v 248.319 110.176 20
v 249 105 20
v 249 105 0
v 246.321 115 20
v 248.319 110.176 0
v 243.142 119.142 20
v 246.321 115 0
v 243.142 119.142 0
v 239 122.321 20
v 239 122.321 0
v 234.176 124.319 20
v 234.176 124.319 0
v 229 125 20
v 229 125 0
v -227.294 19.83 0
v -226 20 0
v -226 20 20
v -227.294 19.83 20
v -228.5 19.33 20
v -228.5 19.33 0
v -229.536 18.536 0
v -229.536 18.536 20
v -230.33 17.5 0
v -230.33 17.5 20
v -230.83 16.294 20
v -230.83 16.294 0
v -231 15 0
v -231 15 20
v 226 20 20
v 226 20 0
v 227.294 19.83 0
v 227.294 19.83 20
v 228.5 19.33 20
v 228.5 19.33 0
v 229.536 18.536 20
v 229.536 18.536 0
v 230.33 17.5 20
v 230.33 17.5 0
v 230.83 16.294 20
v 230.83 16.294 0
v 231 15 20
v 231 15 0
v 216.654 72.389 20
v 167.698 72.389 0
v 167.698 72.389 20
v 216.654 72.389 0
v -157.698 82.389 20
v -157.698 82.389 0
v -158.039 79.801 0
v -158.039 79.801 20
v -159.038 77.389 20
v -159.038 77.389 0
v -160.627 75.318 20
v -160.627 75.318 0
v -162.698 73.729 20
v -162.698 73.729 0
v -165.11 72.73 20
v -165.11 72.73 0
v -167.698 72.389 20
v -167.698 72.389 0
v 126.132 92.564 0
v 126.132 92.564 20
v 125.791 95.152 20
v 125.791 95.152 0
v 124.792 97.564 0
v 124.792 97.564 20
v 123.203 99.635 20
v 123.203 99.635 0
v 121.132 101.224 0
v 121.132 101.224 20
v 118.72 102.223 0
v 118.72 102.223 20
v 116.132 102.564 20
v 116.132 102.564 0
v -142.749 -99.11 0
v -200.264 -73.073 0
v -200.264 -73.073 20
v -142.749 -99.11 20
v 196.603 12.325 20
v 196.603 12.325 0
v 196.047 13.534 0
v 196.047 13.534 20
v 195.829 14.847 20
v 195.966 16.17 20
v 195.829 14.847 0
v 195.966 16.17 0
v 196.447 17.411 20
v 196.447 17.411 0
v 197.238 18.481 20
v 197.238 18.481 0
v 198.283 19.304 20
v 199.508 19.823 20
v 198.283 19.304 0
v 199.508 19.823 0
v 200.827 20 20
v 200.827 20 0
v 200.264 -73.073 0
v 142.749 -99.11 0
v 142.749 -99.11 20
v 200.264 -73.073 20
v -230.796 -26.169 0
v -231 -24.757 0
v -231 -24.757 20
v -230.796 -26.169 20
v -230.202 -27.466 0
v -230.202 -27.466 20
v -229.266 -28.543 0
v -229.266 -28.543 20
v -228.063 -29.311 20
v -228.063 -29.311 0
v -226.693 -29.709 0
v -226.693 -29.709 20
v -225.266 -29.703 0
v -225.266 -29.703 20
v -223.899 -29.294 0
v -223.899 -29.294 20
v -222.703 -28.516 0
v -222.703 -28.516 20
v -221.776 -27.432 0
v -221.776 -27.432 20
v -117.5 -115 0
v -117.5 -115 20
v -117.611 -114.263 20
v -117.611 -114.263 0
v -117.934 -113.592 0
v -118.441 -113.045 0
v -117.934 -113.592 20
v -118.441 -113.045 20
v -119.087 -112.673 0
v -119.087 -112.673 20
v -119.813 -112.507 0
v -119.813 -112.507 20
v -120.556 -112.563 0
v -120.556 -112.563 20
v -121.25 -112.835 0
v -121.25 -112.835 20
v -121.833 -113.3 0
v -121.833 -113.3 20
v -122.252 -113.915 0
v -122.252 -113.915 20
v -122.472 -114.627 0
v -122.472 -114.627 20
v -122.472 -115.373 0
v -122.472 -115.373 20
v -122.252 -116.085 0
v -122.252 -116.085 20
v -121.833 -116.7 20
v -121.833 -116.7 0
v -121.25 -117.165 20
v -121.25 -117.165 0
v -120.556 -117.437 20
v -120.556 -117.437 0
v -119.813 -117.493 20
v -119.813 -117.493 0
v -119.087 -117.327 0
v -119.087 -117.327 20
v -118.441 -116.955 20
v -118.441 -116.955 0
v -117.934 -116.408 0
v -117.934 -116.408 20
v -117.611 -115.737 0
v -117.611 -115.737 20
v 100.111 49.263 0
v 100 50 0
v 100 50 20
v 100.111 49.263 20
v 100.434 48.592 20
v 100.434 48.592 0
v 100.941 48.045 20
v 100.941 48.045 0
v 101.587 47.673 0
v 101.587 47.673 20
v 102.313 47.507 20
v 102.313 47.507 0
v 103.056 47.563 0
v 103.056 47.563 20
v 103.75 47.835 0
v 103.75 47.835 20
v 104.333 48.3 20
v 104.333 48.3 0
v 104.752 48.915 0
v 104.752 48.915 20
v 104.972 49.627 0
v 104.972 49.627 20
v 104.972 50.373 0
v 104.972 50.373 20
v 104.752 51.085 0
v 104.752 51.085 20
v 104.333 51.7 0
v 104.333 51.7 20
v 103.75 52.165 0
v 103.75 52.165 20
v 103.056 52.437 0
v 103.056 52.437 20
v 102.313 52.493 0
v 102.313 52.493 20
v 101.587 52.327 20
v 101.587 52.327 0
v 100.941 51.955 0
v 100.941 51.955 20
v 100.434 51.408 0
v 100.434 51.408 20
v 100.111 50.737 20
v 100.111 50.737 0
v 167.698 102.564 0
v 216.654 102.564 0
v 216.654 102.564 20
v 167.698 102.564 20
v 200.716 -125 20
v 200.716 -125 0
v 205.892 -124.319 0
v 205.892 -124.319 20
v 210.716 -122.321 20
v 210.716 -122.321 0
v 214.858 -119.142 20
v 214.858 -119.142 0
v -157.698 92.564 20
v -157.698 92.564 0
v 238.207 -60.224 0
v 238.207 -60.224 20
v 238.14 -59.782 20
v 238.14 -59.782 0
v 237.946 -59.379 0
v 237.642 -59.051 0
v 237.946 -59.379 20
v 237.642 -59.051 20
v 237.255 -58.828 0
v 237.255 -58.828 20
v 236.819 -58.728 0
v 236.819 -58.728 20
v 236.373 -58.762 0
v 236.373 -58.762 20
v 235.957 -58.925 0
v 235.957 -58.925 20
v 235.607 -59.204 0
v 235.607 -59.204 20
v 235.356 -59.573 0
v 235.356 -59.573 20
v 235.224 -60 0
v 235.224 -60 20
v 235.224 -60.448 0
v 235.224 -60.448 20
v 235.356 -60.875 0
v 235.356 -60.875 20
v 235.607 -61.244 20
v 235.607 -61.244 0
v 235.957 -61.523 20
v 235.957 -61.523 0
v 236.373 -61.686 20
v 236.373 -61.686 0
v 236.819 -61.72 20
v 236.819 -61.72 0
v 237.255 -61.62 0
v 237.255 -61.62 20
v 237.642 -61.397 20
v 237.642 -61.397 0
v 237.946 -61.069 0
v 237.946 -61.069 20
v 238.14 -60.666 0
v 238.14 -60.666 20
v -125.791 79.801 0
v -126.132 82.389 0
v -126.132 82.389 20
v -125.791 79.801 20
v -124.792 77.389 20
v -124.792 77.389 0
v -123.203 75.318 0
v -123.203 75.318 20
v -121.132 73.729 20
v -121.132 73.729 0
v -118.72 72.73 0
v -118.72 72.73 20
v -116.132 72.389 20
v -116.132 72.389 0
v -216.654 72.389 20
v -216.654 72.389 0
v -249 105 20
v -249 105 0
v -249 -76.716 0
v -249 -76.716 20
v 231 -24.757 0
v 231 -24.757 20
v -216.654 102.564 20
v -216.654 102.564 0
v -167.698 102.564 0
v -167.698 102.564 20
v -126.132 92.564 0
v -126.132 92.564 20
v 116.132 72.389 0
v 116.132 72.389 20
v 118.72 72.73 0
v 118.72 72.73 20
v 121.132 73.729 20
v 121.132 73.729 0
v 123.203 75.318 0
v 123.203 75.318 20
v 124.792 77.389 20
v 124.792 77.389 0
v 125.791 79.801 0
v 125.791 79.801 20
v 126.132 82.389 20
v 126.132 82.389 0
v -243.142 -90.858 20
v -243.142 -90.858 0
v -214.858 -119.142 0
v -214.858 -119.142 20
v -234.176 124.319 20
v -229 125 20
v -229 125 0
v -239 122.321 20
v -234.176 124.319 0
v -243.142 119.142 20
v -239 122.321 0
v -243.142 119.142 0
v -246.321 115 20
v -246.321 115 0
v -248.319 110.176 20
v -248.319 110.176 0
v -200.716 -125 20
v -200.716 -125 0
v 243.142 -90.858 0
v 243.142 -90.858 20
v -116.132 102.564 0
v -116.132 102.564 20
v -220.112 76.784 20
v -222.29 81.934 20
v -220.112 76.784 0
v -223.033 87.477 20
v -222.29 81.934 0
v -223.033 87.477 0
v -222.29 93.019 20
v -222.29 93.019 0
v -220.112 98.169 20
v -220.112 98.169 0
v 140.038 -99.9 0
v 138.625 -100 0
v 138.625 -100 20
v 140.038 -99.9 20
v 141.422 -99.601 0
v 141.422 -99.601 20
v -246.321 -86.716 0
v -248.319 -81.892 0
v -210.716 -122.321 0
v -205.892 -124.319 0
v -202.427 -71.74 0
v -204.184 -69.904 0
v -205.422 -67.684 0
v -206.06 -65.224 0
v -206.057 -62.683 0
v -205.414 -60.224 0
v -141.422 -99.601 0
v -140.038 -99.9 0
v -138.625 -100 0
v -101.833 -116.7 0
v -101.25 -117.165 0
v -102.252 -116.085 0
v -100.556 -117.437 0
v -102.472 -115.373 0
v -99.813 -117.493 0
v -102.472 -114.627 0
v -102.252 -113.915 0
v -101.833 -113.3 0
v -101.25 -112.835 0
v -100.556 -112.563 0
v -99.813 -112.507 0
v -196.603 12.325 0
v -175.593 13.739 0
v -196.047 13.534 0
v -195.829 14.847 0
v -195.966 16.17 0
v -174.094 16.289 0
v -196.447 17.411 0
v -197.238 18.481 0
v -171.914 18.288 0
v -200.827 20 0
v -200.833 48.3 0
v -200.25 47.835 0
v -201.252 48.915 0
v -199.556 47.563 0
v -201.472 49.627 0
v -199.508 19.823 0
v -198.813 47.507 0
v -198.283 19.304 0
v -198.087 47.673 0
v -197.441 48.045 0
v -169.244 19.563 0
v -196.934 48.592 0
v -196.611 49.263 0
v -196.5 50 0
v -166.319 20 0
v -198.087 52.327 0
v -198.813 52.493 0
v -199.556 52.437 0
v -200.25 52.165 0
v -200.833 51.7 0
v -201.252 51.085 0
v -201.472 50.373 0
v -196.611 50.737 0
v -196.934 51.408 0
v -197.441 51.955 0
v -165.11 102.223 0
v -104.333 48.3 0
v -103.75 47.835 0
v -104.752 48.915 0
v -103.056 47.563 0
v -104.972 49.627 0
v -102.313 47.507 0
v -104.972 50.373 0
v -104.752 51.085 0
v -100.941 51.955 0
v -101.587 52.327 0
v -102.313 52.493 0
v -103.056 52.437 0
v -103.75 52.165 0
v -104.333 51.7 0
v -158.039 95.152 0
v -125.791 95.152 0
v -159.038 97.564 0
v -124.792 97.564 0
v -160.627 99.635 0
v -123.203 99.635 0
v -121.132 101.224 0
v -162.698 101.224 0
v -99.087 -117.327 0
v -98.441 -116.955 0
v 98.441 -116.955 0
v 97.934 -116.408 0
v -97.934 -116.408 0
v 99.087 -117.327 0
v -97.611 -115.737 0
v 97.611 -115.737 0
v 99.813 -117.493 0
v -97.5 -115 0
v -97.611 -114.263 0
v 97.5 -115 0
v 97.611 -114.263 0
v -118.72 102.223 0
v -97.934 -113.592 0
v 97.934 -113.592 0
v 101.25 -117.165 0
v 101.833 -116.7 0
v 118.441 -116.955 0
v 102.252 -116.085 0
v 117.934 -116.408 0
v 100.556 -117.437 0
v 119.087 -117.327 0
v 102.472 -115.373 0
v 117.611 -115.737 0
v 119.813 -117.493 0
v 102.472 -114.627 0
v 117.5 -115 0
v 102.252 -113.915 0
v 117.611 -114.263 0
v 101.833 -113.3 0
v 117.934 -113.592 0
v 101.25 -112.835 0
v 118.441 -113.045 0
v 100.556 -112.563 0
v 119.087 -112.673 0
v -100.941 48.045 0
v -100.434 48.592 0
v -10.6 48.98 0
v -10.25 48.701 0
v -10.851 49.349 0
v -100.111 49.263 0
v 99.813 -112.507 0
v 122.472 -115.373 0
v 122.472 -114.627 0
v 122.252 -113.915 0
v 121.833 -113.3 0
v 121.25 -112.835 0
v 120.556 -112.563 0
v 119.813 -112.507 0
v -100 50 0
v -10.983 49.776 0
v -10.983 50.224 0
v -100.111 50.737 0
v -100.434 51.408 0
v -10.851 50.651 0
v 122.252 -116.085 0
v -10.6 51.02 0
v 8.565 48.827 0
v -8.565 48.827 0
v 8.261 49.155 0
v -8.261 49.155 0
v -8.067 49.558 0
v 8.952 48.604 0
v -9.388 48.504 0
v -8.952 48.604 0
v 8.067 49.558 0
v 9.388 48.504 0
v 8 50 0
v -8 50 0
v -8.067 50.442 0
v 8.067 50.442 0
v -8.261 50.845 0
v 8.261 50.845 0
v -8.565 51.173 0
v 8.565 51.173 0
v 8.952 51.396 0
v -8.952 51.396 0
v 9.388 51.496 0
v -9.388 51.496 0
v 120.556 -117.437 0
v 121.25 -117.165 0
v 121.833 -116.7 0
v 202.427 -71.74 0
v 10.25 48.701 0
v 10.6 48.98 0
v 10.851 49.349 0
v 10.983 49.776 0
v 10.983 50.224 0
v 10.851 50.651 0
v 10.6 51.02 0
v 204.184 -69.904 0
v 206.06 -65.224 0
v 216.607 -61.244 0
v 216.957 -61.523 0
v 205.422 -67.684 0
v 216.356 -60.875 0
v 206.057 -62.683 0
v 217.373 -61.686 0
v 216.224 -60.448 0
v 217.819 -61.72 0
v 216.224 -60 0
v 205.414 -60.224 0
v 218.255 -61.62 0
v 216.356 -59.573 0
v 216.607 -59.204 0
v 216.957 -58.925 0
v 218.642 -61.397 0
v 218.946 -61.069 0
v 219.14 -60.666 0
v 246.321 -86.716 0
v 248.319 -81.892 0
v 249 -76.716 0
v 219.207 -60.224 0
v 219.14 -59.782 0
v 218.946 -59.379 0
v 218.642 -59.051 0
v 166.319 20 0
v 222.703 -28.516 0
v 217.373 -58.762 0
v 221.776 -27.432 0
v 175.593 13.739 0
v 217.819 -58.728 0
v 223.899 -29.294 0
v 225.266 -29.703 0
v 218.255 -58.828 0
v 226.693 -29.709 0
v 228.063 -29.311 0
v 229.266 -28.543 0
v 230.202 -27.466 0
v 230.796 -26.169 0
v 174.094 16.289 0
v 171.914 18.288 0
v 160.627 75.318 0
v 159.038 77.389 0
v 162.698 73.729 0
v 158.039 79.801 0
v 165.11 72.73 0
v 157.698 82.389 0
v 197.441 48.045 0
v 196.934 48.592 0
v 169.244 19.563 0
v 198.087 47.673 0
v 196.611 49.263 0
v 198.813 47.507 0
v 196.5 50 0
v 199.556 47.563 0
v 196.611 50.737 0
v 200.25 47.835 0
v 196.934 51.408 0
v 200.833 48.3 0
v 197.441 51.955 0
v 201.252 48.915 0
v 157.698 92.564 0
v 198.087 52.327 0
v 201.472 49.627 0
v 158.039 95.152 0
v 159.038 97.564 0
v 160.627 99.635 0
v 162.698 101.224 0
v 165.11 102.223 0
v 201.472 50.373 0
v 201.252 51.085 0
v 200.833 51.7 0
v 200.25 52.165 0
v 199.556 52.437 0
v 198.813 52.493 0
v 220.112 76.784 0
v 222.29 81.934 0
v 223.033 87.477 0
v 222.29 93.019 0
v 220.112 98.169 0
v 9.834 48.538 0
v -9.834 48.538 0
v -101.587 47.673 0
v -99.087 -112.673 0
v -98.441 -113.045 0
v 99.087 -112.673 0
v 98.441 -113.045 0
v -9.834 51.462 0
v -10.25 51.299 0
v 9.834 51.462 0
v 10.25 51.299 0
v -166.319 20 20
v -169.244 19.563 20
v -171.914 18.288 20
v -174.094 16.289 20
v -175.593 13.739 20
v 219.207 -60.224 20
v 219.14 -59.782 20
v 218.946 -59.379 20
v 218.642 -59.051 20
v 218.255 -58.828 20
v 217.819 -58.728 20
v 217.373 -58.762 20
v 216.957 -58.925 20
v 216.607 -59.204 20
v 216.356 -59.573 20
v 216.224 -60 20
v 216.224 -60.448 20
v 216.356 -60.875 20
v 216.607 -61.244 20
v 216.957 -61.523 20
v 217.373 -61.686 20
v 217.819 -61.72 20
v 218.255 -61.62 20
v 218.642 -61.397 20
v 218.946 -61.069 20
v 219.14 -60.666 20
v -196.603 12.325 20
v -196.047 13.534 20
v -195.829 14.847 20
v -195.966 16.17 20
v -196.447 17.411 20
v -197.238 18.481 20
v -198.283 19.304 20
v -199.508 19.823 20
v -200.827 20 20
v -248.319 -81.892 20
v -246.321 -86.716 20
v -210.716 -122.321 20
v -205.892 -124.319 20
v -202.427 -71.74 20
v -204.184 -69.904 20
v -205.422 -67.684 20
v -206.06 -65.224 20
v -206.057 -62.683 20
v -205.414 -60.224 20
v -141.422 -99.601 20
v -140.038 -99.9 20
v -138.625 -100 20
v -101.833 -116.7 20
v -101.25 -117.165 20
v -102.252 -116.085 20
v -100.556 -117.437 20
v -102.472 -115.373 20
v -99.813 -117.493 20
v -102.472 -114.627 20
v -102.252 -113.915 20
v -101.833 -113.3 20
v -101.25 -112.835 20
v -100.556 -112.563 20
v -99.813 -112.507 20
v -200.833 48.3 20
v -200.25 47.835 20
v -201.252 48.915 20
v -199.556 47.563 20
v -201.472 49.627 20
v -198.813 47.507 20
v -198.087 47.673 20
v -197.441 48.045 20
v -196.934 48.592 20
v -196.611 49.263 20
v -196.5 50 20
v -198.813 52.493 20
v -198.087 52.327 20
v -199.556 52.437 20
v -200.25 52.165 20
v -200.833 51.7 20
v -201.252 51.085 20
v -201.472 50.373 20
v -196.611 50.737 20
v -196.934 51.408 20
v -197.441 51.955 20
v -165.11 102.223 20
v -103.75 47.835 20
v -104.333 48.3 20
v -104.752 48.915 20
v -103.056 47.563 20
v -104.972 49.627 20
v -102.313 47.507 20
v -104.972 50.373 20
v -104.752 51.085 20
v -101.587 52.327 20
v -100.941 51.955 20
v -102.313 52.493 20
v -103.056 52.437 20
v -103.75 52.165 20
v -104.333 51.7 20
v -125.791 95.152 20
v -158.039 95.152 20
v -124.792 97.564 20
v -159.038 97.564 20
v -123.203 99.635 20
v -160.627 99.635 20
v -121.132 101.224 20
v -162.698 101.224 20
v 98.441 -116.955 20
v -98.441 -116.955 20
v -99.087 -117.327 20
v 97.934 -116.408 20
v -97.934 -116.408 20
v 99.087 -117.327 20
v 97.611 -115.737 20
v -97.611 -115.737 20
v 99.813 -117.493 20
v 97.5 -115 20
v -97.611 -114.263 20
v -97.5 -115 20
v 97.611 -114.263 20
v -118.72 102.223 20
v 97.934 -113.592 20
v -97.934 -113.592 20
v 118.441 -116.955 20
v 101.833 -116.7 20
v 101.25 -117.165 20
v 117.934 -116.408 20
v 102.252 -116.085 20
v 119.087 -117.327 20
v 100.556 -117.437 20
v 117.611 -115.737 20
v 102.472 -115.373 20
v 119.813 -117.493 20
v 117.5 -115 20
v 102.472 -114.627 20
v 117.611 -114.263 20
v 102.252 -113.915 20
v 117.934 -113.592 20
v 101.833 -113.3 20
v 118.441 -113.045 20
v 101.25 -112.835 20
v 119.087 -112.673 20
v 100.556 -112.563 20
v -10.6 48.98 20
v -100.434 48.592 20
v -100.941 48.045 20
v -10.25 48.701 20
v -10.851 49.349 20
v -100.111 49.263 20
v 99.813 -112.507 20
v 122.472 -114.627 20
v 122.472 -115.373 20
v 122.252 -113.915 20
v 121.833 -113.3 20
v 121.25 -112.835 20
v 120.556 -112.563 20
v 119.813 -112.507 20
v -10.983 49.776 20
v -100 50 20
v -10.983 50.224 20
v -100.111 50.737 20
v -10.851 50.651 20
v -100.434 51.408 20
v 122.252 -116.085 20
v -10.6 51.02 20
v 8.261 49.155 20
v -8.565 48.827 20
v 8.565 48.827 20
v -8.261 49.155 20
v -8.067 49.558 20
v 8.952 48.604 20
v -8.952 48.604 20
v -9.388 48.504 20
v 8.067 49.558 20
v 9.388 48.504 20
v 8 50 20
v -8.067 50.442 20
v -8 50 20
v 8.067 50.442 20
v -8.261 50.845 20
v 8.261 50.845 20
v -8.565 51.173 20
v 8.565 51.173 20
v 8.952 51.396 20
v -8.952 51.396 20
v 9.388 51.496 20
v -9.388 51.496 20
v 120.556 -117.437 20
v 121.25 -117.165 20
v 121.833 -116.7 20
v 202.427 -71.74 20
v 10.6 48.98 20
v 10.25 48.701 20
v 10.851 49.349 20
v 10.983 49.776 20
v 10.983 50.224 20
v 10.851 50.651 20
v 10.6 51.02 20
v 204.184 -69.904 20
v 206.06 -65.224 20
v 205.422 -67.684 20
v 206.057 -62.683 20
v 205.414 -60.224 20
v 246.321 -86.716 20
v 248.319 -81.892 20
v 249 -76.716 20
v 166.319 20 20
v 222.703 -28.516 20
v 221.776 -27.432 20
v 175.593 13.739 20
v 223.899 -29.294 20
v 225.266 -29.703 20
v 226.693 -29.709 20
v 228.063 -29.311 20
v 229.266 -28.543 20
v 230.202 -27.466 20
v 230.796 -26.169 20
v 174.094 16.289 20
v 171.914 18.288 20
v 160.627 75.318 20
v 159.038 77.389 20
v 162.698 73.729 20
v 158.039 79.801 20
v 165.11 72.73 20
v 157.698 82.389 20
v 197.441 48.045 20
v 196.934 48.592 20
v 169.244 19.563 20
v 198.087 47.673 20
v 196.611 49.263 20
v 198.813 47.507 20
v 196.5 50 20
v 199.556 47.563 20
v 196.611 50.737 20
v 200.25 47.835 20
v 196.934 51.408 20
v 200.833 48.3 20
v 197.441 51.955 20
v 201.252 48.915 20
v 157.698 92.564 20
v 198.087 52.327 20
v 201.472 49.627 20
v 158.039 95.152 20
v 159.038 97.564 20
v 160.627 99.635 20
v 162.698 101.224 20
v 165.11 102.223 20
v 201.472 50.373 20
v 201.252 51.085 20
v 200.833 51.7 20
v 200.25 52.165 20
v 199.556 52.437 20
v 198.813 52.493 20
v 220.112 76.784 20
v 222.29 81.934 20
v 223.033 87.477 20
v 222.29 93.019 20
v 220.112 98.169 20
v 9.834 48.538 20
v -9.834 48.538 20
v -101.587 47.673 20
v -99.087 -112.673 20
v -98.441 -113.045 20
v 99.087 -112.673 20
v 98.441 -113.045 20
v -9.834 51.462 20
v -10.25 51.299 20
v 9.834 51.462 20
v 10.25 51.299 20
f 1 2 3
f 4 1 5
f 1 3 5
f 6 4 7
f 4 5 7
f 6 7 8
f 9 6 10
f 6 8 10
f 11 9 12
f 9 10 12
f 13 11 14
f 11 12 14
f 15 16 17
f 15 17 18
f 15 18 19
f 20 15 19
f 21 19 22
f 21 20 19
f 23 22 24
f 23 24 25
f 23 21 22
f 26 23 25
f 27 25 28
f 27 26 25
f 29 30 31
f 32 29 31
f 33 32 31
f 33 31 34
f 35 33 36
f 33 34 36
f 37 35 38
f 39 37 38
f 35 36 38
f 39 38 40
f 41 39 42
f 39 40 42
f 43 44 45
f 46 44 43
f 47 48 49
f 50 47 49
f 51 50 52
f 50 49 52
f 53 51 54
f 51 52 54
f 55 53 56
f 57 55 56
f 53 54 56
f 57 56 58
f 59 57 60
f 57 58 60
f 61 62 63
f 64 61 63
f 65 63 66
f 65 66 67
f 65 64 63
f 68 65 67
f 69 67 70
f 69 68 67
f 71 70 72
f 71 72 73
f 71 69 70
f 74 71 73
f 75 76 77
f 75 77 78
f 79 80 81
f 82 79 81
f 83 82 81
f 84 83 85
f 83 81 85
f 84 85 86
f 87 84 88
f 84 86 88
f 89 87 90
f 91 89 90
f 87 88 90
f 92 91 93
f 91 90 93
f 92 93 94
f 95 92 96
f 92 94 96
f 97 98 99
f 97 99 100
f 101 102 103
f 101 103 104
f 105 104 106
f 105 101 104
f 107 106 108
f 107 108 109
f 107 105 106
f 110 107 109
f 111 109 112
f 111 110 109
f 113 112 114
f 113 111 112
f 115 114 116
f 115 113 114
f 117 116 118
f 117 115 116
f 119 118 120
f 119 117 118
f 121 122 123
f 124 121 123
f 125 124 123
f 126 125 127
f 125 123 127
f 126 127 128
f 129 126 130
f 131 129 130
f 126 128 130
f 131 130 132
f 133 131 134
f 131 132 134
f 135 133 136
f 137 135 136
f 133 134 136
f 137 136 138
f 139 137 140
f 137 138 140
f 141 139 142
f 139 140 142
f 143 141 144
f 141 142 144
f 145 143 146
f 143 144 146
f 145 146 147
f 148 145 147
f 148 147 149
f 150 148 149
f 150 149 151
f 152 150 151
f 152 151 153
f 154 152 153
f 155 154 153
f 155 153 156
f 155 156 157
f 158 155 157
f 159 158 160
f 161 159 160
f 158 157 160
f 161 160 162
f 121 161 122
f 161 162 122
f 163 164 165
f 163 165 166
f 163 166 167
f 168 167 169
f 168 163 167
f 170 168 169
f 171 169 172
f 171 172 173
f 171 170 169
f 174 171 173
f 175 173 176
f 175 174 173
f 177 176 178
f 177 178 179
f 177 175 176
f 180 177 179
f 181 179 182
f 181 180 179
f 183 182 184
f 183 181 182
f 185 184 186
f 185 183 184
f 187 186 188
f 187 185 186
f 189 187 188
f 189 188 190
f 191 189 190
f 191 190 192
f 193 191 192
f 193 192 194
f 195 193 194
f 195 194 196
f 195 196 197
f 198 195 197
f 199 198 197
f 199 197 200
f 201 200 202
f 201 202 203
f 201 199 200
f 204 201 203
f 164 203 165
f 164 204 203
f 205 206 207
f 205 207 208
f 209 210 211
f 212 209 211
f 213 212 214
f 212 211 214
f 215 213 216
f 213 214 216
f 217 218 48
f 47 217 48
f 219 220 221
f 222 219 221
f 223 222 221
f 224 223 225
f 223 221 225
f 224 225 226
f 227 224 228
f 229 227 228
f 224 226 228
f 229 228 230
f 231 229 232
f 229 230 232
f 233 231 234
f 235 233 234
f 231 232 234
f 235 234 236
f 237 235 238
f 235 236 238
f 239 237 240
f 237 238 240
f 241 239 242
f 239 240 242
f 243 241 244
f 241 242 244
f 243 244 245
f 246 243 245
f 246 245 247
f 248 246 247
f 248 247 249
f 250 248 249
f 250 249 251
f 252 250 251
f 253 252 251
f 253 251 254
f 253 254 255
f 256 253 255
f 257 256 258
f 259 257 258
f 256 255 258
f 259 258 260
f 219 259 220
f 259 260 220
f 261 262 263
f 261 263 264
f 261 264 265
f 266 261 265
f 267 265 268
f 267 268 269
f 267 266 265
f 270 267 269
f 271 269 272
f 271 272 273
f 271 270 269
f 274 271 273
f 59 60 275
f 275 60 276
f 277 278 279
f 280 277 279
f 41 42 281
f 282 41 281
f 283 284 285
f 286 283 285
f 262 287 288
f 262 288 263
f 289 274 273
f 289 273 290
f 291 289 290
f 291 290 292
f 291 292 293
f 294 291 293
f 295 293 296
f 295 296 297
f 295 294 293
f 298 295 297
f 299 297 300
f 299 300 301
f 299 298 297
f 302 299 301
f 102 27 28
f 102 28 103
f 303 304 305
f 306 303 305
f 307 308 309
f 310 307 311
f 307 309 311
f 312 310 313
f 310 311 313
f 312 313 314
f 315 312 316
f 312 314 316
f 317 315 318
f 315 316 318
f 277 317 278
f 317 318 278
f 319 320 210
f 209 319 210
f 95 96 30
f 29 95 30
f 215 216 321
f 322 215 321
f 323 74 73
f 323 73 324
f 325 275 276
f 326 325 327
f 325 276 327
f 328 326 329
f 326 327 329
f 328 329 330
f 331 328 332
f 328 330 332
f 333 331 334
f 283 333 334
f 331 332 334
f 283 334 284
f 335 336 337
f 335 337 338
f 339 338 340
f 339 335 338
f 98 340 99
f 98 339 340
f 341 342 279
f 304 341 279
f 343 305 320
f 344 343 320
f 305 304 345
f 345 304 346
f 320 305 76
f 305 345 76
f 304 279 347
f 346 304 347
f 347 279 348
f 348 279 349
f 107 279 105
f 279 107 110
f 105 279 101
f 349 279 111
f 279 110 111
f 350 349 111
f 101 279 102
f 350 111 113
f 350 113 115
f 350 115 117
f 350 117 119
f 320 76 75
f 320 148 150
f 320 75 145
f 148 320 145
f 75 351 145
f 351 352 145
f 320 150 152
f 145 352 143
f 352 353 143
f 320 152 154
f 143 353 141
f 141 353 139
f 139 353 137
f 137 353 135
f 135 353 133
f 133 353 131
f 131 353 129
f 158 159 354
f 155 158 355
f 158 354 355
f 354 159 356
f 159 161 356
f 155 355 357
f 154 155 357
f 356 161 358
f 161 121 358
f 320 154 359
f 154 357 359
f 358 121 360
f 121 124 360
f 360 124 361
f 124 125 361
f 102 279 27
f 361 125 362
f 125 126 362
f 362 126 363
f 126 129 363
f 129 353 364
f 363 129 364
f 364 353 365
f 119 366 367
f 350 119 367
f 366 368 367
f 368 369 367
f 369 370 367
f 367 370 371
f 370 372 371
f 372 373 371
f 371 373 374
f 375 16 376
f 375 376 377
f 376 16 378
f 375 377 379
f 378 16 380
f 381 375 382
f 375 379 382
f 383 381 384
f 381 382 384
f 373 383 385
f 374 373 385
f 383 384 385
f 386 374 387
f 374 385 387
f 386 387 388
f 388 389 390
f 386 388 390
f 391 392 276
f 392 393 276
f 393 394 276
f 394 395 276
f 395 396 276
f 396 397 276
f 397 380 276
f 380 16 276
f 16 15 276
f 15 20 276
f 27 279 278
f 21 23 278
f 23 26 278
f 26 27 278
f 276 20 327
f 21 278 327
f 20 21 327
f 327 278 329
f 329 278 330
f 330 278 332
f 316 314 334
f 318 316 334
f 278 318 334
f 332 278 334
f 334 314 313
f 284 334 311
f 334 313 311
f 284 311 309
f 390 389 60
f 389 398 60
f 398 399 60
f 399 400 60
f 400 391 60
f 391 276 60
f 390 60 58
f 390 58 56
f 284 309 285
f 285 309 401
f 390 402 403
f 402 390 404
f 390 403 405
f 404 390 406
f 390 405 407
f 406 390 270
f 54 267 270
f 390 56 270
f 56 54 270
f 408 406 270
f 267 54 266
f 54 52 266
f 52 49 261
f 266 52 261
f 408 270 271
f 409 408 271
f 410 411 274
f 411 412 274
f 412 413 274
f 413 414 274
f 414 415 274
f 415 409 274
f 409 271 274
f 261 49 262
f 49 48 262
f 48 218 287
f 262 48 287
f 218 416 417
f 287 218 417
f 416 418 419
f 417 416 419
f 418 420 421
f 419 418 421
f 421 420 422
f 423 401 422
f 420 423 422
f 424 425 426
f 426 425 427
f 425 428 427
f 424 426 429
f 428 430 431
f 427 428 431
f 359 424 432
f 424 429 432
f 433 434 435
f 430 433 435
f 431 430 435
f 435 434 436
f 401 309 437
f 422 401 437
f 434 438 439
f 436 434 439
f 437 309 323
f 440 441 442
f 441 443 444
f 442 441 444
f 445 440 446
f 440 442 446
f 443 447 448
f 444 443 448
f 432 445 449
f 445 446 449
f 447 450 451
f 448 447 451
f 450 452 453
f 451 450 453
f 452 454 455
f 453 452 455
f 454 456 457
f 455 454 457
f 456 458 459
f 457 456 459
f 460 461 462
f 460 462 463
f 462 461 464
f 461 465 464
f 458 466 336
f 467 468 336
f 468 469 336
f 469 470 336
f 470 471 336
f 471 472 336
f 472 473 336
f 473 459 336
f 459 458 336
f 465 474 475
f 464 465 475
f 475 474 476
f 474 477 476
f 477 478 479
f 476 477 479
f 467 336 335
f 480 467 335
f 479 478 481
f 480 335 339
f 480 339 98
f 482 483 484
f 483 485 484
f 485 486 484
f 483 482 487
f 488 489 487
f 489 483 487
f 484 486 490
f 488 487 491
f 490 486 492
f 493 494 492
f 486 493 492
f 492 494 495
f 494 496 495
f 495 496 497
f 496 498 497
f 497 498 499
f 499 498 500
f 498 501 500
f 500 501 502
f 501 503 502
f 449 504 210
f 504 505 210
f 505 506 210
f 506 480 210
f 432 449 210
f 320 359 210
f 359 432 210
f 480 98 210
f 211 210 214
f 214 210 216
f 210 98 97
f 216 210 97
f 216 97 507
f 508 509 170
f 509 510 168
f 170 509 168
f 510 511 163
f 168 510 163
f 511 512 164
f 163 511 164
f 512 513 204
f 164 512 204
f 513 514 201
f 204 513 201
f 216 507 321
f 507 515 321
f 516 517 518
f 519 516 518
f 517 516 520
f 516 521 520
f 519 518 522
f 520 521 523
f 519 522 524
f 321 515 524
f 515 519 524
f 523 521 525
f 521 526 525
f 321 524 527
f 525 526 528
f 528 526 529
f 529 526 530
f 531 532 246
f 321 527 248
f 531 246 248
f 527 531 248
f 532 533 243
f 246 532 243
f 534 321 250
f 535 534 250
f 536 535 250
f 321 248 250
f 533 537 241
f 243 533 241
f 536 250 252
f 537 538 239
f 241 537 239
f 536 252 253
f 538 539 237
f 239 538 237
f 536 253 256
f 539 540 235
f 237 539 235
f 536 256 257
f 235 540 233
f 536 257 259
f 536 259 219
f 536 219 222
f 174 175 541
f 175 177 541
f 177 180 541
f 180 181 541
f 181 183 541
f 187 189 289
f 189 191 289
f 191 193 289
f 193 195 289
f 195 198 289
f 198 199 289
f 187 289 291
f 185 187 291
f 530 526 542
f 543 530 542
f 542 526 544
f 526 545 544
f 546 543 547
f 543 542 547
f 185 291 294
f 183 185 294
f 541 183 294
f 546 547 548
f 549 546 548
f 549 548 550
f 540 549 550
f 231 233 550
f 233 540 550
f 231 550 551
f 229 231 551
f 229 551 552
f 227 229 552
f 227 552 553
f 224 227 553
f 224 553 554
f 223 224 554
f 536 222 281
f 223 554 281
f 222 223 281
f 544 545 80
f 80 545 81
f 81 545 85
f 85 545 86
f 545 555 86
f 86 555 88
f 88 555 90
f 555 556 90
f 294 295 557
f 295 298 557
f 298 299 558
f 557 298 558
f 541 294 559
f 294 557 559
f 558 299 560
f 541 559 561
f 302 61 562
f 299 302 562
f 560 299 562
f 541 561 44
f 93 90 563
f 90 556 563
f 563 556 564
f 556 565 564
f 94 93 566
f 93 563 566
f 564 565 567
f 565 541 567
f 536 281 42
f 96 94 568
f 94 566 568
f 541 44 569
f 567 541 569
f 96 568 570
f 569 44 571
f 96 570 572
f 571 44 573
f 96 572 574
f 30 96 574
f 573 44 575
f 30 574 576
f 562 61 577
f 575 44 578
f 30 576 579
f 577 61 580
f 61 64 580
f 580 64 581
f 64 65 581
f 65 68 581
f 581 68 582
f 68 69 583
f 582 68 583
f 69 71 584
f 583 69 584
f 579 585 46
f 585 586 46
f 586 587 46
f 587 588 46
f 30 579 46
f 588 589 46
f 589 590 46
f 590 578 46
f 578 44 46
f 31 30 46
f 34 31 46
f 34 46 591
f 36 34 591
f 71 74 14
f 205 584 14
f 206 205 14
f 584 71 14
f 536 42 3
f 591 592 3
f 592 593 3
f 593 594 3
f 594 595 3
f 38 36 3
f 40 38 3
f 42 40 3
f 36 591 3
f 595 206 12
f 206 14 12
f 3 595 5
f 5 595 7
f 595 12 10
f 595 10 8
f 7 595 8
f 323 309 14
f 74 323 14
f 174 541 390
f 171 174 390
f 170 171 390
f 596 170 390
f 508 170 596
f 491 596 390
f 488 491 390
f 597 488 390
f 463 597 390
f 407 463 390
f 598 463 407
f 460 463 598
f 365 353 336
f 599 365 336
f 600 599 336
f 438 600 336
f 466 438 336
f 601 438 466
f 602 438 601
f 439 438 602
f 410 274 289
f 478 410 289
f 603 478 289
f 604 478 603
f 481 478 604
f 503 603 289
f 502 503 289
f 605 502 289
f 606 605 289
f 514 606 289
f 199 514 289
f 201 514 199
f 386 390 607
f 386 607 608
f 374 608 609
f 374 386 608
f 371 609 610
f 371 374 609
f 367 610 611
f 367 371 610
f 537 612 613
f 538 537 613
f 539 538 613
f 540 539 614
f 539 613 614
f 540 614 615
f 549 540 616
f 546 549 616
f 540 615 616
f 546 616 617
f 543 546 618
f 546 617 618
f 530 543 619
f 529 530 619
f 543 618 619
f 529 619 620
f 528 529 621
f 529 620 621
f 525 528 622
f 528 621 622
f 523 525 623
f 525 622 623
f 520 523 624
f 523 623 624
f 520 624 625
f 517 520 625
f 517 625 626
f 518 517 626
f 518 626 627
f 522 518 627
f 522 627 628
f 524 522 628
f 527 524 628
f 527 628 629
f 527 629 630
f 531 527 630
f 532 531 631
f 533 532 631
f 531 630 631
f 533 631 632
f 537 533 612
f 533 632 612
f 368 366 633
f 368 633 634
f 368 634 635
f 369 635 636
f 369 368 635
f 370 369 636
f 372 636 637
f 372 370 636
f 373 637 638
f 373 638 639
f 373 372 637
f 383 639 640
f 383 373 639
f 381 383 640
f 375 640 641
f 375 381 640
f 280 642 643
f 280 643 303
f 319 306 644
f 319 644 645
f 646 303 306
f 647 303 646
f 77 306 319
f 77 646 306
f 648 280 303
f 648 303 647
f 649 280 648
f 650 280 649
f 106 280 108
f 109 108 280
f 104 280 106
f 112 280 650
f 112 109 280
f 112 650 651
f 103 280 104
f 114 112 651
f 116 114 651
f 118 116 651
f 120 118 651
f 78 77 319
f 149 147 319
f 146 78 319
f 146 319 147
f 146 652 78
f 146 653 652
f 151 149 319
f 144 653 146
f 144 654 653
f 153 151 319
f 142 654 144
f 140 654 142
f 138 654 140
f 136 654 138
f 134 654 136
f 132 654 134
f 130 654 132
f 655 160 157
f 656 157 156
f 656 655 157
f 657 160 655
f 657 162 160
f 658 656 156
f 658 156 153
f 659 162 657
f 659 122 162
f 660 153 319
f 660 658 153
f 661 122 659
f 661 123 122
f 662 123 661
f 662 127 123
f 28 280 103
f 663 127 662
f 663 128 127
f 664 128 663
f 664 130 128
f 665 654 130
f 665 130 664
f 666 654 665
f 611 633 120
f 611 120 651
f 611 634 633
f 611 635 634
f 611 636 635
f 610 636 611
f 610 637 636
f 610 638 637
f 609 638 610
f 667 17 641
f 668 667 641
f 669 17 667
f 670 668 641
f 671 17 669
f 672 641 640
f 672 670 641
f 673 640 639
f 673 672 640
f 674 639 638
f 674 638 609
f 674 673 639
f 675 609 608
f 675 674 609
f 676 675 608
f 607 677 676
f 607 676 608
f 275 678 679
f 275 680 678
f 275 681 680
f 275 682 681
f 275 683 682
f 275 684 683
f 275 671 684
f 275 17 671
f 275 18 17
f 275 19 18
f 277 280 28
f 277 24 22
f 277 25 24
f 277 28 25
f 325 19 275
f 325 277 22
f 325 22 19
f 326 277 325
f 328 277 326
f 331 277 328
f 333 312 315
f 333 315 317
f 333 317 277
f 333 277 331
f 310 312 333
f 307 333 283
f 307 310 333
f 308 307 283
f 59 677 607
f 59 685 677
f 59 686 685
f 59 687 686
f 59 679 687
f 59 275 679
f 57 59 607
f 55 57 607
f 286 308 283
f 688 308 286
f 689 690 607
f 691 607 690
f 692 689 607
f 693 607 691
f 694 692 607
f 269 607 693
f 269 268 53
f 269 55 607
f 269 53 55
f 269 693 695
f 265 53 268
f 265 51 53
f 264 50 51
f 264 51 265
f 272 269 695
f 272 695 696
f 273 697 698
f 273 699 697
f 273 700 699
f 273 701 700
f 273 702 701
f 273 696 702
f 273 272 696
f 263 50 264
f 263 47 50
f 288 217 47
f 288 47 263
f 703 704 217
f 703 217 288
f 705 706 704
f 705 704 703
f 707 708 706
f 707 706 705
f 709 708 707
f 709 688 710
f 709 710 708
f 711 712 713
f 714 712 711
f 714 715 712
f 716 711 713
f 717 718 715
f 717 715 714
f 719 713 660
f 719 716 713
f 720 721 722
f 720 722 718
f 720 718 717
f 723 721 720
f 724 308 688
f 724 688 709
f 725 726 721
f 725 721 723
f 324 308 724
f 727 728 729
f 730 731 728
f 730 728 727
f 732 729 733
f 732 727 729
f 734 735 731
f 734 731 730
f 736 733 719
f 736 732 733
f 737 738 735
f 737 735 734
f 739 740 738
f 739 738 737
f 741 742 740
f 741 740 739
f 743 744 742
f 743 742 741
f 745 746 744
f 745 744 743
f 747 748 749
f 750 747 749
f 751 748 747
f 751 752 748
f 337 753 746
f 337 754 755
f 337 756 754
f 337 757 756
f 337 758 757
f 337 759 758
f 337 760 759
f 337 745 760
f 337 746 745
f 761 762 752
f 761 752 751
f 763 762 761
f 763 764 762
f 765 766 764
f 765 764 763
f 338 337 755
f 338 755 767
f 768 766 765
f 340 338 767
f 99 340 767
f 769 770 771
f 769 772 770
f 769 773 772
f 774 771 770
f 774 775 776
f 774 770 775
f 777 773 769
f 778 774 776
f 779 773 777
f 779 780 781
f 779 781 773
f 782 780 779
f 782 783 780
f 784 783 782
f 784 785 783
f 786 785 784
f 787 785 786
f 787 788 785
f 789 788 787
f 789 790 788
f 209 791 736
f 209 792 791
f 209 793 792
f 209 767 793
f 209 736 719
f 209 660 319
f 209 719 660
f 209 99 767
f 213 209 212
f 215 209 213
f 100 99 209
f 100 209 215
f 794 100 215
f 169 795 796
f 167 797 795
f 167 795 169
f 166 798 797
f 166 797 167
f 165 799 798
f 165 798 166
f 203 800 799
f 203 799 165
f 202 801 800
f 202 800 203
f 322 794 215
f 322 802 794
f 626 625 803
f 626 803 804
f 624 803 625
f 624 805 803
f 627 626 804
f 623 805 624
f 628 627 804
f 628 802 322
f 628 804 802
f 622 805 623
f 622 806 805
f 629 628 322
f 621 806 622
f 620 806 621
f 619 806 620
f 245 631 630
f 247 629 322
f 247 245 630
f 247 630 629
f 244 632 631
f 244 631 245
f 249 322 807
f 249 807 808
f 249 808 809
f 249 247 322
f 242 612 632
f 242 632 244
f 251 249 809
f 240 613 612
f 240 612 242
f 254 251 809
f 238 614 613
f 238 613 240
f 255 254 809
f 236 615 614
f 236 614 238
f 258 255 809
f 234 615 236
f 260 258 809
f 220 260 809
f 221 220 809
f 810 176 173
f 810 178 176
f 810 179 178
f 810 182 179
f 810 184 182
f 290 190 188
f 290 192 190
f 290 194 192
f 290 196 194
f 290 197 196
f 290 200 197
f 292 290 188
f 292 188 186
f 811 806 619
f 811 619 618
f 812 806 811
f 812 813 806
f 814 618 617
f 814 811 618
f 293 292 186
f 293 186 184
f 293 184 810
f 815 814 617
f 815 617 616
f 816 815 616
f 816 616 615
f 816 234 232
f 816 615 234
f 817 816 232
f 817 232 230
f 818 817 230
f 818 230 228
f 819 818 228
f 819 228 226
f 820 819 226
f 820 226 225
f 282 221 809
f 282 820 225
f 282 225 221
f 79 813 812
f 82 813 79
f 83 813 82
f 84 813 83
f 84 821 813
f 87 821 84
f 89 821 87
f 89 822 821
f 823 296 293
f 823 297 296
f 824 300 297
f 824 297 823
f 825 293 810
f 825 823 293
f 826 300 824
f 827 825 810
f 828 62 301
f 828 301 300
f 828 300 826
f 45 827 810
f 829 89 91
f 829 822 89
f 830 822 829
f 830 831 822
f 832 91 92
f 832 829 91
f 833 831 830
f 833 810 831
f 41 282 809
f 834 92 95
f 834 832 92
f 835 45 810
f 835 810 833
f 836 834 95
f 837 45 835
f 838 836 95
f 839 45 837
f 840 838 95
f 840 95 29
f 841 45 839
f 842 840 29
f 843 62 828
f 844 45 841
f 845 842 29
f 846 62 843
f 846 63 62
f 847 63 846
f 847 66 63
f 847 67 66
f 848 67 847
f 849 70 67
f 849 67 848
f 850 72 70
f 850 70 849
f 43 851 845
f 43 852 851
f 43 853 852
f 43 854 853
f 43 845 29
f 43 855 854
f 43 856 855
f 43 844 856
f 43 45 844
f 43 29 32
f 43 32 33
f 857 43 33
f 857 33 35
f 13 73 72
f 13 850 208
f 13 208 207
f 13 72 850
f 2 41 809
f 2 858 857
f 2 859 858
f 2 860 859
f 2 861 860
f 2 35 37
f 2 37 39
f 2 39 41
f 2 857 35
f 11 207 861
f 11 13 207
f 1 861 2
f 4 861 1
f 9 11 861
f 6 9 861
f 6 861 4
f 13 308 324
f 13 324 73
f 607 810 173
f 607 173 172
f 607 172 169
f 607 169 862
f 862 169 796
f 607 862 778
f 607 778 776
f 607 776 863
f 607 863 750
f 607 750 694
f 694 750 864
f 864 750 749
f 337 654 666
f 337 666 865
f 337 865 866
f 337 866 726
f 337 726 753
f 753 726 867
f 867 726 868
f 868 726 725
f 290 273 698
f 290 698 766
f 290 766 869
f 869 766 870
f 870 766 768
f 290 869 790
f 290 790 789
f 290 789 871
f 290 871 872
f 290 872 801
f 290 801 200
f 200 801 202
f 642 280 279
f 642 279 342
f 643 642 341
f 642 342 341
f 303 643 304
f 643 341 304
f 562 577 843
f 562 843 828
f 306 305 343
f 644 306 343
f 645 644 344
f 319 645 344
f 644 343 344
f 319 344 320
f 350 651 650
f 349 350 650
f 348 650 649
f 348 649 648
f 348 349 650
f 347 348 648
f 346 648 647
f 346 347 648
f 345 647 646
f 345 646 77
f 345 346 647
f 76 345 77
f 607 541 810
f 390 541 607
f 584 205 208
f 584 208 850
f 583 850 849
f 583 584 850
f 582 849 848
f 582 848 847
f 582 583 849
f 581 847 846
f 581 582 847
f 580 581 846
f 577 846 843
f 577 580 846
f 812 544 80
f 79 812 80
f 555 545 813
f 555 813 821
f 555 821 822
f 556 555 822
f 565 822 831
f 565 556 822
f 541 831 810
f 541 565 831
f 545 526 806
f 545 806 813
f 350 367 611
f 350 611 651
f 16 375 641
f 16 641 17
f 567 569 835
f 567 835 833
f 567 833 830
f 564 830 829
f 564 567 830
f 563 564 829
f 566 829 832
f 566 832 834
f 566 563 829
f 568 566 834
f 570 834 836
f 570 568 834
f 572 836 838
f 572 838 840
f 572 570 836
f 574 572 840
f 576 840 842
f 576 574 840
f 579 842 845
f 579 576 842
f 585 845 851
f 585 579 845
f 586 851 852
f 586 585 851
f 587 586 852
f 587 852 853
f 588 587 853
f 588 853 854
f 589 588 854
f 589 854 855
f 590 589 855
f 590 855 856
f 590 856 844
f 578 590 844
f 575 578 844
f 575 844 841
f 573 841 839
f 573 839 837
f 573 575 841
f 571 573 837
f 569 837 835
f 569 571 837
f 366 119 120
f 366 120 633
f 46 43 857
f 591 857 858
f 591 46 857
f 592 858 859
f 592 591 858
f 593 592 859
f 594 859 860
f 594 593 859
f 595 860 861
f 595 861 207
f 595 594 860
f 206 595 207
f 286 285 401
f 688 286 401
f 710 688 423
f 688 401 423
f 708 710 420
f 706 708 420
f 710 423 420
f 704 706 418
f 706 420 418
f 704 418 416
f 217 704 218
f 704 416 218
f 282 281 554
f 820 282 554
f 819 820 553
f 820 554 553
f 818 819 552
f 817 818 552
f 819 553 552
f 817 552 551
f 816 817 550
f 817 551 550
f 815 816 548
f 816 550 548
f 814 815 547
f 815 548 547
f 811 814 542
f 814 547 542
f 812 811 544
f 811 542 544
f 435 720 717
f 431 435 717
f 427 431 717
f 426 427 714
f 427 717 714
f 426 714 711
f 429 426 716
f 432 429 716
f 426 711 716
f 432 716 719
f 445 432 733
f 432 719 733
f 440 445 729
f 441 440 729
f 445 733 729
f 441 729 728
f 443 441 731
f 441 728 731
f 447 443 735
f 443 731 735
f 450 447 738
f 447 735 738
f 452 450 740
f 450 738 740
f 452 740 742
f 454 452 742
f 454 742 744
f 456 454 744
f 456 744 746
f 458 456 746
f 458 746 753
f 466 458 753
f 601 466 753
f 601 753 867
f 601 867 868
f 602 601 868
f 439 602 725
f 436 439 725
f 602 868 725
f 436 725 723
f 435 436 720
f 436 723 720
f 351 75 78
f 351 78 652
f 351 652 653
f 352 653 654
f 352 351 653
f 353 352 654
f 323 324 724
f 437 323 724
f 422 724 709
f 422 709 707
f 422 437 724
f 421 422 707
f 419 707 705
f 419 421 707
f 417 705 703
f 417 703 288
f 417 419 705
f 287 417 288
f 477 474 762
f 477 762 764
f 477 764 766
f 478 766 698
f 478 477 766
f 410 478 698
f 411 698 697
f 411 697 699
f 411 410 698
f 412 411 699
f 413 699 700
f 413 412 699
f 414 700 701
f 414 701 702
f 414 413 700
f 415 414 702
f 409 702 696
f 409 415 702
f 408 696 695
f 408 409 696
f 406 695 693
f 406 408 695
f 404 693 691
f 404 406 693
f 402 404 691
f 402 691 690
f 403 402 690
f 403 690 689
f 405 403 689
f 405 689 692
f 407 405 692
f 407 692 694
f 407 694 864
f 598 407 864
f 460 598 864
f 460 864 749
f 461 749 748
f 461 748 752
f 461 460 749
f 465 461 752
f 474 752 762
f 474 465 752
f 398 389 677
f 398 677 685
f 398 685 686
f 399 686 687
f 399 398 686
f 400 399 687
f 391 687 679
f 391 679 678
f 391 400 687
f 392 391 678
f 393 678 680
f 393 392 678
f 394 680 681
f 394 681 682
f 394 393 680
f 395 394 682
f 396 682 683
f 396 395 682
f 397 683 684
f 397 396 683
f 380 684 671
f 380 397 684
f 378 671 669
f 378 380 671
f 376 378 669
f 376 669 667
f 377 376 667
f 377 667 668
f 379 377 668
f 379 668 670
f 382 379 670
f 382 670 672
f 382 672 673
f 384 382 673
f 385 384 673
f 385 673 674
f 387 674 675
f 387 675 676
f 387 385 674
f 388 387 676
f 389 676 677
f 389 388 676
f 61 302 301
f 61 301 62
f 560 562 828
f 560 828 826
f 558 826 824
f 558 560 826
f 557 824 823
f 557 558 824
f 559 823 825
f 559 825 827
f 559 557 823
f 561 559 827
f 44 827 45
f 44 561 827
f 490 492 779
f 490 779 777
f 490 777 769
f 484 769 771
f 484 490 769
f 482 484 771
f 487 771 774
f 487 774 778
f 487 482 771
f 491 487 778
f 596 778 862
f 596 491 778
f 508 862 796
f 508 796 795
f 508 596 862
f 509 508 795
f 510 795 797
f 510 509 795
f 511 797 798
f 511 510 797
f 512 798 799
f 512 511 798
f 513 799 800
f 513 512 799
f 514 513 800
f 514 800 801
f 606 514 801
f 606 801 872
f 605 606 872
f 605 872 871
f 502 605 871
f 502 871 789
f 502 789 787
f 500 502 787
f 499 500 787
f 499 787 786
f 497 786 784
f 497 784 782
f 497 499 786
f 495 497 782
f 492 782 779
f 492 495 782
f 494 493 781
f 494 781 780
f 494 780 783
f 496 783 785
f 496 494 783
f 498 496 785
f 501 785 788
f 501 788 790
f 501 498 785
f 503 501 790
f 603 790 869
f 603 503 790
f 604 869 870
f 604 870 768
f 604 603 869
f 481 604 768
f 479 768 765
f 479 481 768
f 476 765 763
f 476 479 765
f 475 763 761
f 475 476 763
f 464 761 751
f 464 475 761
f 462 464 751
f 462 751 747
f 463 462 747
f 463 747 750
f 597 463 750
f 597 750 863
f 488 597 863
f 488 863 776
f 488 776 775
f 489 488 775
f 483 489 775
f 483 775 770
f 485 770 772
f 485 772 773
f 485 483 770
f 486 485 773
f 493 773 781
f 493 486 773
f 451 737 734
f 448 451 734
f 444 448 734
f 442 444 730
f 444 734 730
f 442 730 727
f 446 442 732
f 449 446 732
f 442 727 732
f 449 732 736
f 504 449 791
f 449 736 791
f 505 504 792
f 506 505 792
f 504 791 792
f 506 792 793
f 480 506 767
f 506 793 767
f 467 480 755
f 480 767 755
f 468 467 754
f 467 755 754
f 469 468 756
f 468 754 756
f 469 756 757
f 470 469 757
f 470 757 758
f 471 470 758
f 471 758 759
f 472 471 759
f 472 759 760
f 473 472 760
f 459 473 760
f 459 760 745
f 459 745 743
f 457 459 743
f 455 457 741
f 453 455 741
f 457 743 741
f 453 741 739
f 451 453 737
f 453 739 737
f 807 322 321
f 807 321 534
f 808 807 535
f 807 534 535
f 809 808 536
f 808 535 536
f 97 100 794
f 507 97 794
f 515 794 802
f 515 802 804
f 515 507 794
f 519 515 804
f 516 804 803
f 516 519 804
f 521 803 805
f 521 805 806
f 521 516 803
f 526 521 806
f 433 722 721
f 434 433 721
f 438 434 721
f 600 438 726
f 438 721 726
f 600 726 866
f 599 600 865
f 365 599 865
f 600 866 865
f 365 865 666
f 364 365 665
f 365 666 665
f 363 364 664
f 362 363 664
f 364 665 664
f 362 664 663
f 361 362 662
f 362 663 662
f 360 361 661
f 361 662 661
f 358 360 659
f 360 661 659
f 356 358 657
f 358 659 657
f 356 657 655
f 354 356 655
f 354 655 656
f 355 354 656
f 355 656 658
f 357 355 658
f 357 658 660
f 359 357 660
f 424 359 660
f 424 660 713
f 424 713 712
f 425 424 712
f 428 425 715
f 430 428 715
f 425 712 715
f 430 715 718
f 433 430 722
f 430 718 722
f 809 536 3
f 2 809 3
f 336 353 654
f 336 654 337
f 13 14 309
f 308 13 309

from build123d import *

# Parameters (mm, degrees)
SKETCH1_R           = 2.5
SKETCH1_R_2         = 1.5
BOSS_EXTRUDE1_DEPTH = 20
SKETCH3_R           = 2.5
CUT_EXTRUDE1_DEPTH  = 20
SKETCH4_R           = 1.5
CUT_EXTRUDE2_DEPTH  = 20


with BuildPart() as part:
    # Sketch1 → Boss-Extrude1 (new body)
    with BuildSketch(Plane.XY):
        with BuildLine():
            Line((-200.715728753, -125), (200.715728753, -125))
            ThreePointArc((200.715728753, -125), (208.3693974, -123.47759065), (214.857864376, -119.142135624))
            Line((214.857864376, -119.142135624), (243.142135624, -90.857864376))
            ThreePointArc((243.142135624, -90.857864376), (247.47759065, -84.3693974), (249, -76.715728753))
            Line((249, -76.715728753), (249, 105))
            ThreePointArc((249, 105), (243.142135624, 119.142135624), (229, 125))
            Line((229, 125), (-229, 125))
            ThreePointArc((-229, 125), (-243.142135624, 119.142135624), (-249, 105))
            Line((-249, 105), (-249, -76.715728753))
            ThreePointArc((-249, -76.715728753), (-247.47759065, -84.3693974), (-243.142135624, -90.857864376))
            Line((-243.142135624, -90.857864376), (-214.857864376, -119.142135624))
            ThreePointArc((-214.857864376, -119.142135624), (-208.3693974, -123.47759065), (-200.715728753, -125))
        make_face()
        with Locations((-199, 50)):
            Circle(SKETCH1_R, mode=Mode.SUBTRACT)
        with Locations((-102.5, 50)):
            Circle(SKETCH1_R, mode=Mode.SUBTRACT)
        with Locations(Location((102.5, 50, 0), (0, 0, 180))):
            Circle(SKETCH1_R, mode=Mode.SUBTRACT)
        with Locations(Location((199, 50, 0), (0, 0, 180))):
            Circle(SKETCH1_R, mode=Mode.SUBTRACT)
        with Locations((-9.5, 50)):
            Circle(SKETCH1_R_2, mode=Mode.SUBTRACT)
        with Locations(Location((9.5, 50, 0), (0, 0, 180))):
            Circle(SKETCH1_R_2, mode=Mode.SUBTRACT)
        with BuildLine():
            Line((116.131800265, 102.563522474), (-116.131800265, 102.563522474))
            ThreePointArc((-116.131800265, 102.563522474), (-123.202868077, 99.634590285), (-126.131800265, 92.563522474))
            Line((-126.131800265, 92.563522474), (-126.131800265, 82.389498448))
            ThreePointArc((-126.131800265, 82.389498448), (-123.202868077, 75.318430636), (-116.131800265, 72.389498448))
            Line((-116.131800265, 72.389498448), (116.131800265, 72.389498448))
            ThreePointArc((116.131800265, 72.389498448), (123.202868077, 75.318430636), (126.131800265, 82.389498448))
            Line((126.131800265, 82.389498448), (126.131800265, 92.563522474))
            ThreePointArc((126.131800265, 92.563522474), (123.202868077, 99.634590285), (116.131800265, 102.563522474))
        make_face(mode=Mode.SUBTRACT)
        with BuildLine():
            Line((-216.653872342, 102.563522474), (-167.698471554, 102.563522474))
            ThreePointArc((-167.698471554, 102.563522474), (-160.627403742, 99.634590285), (-157.698471554, 92.563522474))
            Line((-157.698471554, 92.563522474), (-157.698471554, 82.389498448))
            ThreePointArc((-157.698471554, 82.389498448), (-160.627403742, 75.318430636), (-167.698471554, 72.389498448))
            Line((-167.698471554, 72.389498448), (-216.653872342, 72.389498448))
            ThreePointArc((-216.653872342, 72.389498448), (-223.033485264, 87.476510461), (-216.653872342, 102.563522474))
        make_face(mode=Mode.SUBTRACT)
        with BuildLine():
            Line((166.318803771, 20), (-166.318803771, 20))
            ThreePointArc((-166.318803771, 20), (-171.913744739, 18.288343355), (-175.593362129, 13.739327113))
            Line((-175.593362129, 13.739327113), (-205.413984615, -60.224007784))
            ThreePointArc((-205.413984615, -60.224007784), (-205.421516172, -67.683927162), (-200.263522564, -73.073320059))
            Line((-200.263522564, -73.073320059), (-142.749435826, -99.109985162))
            ThreePointArc((-142.749435826, -99.109985162), (-140.734859414, -99.774964236), (-138.625339518, -100))
            Line((-138.625339518, -100), (138.625339518, -100))
            ThreePointArc((138.625339518, -100), (140.734859414, -99.774964236), (142.749435826, -99.109985162))
            Line((142.749435826, -99.109985162), (200.263522564, -73.073320059))
            ThreePointArc((200.263522564, -73.073320059), (205.421516172, -67.683927162), (205.413984615, -60.224007784))
            Line((205.413984615, -60.224007784), (175.593362129, 13.739327113))
            ThreePointArc((175.593362129, 13.739327113), (171.913744739, 18.288343355), (166.318803771, 20))
        make_face(mode=Mode.SUBTRACT)
        with BuildLine():
            Line((-231, 15), (-231, -24.756893222))
            ThreePointArc((-231, -24.756893222), (-227.392475088, -29.55908159), (-221.775594749, -27.431664291))
            Line((-221.775594749, -27.431664291), (-196.602681295, 12.325228931))
            ThreePointArc((-196.602681295, 12.325228931), (-196.446798009, 17.411031382), (-200.827086546, 20))
            Line((-200.827086546, 20), (-226, 20))
            ThreePointArc((-226, 20), (-229.535533906, 18.535533906), (-231, 15))
        make_face(mode=Mode.SUBTRACT)
        with BuildLine():
            Line((221.775594749, -27.431664291), (196.602681295, 12.325228931))
            ThreePointArc((196.602681295, 12.325228931), (196.446798009, 17.411031382), (200.827086546, 20))
            Line((200.827086546, 20), (226, 20))
            ThreePointArc((226, 20), (229.535533906, 18.535533906), (231, 15))
            Line((231, 15), (231, -24.756893222))
            ThreePointArc((231, -24.756893222), (227.392475088, -29.55908159), (221.775594749, -27.431664291))
        make_face(mode=Mode.SUBTRACT)
        with BuildLine():
            Line((157.698471554, 92.563522474), (157.698471554, 82.389498448))
            ThreePointArc((157.698471554, 82.389498448), (160.627403742, 75.318430636), (167.698471554, 72.389498448))
            Line((167.698471554, 72.389498448), (216.653872342, 72.389498448))
            ThreePointArc((216.653872342, 72.389498448), (223.033485264, 87.476510461), (216.653872342, 102.563522474))
            Line((216.653872342, 102.563522474), (167.698471554, 102.563522474))
            ThreePointArc((167.698471554, 102.563522474), (160.627403742, 99.634590285), (157.698471554, 92.563522474))
        make_face(mode=Mode.SUBTRACT)
    extrude(amount=BOSS_EXTRUDE1_DEPTH)

    # Sketch3 → Cut-Extrude1 (cut)
    with BuildSketch(Plane.XY.offset(20)):
        with Locations((-100, -115)):
            Circle(SKETCH3_R)
        with Locations((-120, -115)):
            Circle(SKETCH3_R)
        with Locations(Location((100, -115, 0), (0, 0, 180))):
            Circle(SKETCH3_R)
        with Locations(Location((120, -115, 0), (0, 0, 180))):
            Circle(SKETCH3_R)
    extrude(amount=-CUT_EXTRUDE1_DEPTH, mode=Mode.SUBTRACT)

    # Sketch4 → Cut-Extrude2 (cut)
    with BuildSketch(Plane.XY.offset(20)):
        with Locations((236.706992308, -60.224007784)):
            Circle(SKETCH4_R)
        with Locations((217.706992308, -60.224007784)):
            Circle(SKETCH4_R)
    extrude(amount=-CUT_EXTRUDE2_DEPTH, mode=Mode.SUBTRACT)


solid = part.part
